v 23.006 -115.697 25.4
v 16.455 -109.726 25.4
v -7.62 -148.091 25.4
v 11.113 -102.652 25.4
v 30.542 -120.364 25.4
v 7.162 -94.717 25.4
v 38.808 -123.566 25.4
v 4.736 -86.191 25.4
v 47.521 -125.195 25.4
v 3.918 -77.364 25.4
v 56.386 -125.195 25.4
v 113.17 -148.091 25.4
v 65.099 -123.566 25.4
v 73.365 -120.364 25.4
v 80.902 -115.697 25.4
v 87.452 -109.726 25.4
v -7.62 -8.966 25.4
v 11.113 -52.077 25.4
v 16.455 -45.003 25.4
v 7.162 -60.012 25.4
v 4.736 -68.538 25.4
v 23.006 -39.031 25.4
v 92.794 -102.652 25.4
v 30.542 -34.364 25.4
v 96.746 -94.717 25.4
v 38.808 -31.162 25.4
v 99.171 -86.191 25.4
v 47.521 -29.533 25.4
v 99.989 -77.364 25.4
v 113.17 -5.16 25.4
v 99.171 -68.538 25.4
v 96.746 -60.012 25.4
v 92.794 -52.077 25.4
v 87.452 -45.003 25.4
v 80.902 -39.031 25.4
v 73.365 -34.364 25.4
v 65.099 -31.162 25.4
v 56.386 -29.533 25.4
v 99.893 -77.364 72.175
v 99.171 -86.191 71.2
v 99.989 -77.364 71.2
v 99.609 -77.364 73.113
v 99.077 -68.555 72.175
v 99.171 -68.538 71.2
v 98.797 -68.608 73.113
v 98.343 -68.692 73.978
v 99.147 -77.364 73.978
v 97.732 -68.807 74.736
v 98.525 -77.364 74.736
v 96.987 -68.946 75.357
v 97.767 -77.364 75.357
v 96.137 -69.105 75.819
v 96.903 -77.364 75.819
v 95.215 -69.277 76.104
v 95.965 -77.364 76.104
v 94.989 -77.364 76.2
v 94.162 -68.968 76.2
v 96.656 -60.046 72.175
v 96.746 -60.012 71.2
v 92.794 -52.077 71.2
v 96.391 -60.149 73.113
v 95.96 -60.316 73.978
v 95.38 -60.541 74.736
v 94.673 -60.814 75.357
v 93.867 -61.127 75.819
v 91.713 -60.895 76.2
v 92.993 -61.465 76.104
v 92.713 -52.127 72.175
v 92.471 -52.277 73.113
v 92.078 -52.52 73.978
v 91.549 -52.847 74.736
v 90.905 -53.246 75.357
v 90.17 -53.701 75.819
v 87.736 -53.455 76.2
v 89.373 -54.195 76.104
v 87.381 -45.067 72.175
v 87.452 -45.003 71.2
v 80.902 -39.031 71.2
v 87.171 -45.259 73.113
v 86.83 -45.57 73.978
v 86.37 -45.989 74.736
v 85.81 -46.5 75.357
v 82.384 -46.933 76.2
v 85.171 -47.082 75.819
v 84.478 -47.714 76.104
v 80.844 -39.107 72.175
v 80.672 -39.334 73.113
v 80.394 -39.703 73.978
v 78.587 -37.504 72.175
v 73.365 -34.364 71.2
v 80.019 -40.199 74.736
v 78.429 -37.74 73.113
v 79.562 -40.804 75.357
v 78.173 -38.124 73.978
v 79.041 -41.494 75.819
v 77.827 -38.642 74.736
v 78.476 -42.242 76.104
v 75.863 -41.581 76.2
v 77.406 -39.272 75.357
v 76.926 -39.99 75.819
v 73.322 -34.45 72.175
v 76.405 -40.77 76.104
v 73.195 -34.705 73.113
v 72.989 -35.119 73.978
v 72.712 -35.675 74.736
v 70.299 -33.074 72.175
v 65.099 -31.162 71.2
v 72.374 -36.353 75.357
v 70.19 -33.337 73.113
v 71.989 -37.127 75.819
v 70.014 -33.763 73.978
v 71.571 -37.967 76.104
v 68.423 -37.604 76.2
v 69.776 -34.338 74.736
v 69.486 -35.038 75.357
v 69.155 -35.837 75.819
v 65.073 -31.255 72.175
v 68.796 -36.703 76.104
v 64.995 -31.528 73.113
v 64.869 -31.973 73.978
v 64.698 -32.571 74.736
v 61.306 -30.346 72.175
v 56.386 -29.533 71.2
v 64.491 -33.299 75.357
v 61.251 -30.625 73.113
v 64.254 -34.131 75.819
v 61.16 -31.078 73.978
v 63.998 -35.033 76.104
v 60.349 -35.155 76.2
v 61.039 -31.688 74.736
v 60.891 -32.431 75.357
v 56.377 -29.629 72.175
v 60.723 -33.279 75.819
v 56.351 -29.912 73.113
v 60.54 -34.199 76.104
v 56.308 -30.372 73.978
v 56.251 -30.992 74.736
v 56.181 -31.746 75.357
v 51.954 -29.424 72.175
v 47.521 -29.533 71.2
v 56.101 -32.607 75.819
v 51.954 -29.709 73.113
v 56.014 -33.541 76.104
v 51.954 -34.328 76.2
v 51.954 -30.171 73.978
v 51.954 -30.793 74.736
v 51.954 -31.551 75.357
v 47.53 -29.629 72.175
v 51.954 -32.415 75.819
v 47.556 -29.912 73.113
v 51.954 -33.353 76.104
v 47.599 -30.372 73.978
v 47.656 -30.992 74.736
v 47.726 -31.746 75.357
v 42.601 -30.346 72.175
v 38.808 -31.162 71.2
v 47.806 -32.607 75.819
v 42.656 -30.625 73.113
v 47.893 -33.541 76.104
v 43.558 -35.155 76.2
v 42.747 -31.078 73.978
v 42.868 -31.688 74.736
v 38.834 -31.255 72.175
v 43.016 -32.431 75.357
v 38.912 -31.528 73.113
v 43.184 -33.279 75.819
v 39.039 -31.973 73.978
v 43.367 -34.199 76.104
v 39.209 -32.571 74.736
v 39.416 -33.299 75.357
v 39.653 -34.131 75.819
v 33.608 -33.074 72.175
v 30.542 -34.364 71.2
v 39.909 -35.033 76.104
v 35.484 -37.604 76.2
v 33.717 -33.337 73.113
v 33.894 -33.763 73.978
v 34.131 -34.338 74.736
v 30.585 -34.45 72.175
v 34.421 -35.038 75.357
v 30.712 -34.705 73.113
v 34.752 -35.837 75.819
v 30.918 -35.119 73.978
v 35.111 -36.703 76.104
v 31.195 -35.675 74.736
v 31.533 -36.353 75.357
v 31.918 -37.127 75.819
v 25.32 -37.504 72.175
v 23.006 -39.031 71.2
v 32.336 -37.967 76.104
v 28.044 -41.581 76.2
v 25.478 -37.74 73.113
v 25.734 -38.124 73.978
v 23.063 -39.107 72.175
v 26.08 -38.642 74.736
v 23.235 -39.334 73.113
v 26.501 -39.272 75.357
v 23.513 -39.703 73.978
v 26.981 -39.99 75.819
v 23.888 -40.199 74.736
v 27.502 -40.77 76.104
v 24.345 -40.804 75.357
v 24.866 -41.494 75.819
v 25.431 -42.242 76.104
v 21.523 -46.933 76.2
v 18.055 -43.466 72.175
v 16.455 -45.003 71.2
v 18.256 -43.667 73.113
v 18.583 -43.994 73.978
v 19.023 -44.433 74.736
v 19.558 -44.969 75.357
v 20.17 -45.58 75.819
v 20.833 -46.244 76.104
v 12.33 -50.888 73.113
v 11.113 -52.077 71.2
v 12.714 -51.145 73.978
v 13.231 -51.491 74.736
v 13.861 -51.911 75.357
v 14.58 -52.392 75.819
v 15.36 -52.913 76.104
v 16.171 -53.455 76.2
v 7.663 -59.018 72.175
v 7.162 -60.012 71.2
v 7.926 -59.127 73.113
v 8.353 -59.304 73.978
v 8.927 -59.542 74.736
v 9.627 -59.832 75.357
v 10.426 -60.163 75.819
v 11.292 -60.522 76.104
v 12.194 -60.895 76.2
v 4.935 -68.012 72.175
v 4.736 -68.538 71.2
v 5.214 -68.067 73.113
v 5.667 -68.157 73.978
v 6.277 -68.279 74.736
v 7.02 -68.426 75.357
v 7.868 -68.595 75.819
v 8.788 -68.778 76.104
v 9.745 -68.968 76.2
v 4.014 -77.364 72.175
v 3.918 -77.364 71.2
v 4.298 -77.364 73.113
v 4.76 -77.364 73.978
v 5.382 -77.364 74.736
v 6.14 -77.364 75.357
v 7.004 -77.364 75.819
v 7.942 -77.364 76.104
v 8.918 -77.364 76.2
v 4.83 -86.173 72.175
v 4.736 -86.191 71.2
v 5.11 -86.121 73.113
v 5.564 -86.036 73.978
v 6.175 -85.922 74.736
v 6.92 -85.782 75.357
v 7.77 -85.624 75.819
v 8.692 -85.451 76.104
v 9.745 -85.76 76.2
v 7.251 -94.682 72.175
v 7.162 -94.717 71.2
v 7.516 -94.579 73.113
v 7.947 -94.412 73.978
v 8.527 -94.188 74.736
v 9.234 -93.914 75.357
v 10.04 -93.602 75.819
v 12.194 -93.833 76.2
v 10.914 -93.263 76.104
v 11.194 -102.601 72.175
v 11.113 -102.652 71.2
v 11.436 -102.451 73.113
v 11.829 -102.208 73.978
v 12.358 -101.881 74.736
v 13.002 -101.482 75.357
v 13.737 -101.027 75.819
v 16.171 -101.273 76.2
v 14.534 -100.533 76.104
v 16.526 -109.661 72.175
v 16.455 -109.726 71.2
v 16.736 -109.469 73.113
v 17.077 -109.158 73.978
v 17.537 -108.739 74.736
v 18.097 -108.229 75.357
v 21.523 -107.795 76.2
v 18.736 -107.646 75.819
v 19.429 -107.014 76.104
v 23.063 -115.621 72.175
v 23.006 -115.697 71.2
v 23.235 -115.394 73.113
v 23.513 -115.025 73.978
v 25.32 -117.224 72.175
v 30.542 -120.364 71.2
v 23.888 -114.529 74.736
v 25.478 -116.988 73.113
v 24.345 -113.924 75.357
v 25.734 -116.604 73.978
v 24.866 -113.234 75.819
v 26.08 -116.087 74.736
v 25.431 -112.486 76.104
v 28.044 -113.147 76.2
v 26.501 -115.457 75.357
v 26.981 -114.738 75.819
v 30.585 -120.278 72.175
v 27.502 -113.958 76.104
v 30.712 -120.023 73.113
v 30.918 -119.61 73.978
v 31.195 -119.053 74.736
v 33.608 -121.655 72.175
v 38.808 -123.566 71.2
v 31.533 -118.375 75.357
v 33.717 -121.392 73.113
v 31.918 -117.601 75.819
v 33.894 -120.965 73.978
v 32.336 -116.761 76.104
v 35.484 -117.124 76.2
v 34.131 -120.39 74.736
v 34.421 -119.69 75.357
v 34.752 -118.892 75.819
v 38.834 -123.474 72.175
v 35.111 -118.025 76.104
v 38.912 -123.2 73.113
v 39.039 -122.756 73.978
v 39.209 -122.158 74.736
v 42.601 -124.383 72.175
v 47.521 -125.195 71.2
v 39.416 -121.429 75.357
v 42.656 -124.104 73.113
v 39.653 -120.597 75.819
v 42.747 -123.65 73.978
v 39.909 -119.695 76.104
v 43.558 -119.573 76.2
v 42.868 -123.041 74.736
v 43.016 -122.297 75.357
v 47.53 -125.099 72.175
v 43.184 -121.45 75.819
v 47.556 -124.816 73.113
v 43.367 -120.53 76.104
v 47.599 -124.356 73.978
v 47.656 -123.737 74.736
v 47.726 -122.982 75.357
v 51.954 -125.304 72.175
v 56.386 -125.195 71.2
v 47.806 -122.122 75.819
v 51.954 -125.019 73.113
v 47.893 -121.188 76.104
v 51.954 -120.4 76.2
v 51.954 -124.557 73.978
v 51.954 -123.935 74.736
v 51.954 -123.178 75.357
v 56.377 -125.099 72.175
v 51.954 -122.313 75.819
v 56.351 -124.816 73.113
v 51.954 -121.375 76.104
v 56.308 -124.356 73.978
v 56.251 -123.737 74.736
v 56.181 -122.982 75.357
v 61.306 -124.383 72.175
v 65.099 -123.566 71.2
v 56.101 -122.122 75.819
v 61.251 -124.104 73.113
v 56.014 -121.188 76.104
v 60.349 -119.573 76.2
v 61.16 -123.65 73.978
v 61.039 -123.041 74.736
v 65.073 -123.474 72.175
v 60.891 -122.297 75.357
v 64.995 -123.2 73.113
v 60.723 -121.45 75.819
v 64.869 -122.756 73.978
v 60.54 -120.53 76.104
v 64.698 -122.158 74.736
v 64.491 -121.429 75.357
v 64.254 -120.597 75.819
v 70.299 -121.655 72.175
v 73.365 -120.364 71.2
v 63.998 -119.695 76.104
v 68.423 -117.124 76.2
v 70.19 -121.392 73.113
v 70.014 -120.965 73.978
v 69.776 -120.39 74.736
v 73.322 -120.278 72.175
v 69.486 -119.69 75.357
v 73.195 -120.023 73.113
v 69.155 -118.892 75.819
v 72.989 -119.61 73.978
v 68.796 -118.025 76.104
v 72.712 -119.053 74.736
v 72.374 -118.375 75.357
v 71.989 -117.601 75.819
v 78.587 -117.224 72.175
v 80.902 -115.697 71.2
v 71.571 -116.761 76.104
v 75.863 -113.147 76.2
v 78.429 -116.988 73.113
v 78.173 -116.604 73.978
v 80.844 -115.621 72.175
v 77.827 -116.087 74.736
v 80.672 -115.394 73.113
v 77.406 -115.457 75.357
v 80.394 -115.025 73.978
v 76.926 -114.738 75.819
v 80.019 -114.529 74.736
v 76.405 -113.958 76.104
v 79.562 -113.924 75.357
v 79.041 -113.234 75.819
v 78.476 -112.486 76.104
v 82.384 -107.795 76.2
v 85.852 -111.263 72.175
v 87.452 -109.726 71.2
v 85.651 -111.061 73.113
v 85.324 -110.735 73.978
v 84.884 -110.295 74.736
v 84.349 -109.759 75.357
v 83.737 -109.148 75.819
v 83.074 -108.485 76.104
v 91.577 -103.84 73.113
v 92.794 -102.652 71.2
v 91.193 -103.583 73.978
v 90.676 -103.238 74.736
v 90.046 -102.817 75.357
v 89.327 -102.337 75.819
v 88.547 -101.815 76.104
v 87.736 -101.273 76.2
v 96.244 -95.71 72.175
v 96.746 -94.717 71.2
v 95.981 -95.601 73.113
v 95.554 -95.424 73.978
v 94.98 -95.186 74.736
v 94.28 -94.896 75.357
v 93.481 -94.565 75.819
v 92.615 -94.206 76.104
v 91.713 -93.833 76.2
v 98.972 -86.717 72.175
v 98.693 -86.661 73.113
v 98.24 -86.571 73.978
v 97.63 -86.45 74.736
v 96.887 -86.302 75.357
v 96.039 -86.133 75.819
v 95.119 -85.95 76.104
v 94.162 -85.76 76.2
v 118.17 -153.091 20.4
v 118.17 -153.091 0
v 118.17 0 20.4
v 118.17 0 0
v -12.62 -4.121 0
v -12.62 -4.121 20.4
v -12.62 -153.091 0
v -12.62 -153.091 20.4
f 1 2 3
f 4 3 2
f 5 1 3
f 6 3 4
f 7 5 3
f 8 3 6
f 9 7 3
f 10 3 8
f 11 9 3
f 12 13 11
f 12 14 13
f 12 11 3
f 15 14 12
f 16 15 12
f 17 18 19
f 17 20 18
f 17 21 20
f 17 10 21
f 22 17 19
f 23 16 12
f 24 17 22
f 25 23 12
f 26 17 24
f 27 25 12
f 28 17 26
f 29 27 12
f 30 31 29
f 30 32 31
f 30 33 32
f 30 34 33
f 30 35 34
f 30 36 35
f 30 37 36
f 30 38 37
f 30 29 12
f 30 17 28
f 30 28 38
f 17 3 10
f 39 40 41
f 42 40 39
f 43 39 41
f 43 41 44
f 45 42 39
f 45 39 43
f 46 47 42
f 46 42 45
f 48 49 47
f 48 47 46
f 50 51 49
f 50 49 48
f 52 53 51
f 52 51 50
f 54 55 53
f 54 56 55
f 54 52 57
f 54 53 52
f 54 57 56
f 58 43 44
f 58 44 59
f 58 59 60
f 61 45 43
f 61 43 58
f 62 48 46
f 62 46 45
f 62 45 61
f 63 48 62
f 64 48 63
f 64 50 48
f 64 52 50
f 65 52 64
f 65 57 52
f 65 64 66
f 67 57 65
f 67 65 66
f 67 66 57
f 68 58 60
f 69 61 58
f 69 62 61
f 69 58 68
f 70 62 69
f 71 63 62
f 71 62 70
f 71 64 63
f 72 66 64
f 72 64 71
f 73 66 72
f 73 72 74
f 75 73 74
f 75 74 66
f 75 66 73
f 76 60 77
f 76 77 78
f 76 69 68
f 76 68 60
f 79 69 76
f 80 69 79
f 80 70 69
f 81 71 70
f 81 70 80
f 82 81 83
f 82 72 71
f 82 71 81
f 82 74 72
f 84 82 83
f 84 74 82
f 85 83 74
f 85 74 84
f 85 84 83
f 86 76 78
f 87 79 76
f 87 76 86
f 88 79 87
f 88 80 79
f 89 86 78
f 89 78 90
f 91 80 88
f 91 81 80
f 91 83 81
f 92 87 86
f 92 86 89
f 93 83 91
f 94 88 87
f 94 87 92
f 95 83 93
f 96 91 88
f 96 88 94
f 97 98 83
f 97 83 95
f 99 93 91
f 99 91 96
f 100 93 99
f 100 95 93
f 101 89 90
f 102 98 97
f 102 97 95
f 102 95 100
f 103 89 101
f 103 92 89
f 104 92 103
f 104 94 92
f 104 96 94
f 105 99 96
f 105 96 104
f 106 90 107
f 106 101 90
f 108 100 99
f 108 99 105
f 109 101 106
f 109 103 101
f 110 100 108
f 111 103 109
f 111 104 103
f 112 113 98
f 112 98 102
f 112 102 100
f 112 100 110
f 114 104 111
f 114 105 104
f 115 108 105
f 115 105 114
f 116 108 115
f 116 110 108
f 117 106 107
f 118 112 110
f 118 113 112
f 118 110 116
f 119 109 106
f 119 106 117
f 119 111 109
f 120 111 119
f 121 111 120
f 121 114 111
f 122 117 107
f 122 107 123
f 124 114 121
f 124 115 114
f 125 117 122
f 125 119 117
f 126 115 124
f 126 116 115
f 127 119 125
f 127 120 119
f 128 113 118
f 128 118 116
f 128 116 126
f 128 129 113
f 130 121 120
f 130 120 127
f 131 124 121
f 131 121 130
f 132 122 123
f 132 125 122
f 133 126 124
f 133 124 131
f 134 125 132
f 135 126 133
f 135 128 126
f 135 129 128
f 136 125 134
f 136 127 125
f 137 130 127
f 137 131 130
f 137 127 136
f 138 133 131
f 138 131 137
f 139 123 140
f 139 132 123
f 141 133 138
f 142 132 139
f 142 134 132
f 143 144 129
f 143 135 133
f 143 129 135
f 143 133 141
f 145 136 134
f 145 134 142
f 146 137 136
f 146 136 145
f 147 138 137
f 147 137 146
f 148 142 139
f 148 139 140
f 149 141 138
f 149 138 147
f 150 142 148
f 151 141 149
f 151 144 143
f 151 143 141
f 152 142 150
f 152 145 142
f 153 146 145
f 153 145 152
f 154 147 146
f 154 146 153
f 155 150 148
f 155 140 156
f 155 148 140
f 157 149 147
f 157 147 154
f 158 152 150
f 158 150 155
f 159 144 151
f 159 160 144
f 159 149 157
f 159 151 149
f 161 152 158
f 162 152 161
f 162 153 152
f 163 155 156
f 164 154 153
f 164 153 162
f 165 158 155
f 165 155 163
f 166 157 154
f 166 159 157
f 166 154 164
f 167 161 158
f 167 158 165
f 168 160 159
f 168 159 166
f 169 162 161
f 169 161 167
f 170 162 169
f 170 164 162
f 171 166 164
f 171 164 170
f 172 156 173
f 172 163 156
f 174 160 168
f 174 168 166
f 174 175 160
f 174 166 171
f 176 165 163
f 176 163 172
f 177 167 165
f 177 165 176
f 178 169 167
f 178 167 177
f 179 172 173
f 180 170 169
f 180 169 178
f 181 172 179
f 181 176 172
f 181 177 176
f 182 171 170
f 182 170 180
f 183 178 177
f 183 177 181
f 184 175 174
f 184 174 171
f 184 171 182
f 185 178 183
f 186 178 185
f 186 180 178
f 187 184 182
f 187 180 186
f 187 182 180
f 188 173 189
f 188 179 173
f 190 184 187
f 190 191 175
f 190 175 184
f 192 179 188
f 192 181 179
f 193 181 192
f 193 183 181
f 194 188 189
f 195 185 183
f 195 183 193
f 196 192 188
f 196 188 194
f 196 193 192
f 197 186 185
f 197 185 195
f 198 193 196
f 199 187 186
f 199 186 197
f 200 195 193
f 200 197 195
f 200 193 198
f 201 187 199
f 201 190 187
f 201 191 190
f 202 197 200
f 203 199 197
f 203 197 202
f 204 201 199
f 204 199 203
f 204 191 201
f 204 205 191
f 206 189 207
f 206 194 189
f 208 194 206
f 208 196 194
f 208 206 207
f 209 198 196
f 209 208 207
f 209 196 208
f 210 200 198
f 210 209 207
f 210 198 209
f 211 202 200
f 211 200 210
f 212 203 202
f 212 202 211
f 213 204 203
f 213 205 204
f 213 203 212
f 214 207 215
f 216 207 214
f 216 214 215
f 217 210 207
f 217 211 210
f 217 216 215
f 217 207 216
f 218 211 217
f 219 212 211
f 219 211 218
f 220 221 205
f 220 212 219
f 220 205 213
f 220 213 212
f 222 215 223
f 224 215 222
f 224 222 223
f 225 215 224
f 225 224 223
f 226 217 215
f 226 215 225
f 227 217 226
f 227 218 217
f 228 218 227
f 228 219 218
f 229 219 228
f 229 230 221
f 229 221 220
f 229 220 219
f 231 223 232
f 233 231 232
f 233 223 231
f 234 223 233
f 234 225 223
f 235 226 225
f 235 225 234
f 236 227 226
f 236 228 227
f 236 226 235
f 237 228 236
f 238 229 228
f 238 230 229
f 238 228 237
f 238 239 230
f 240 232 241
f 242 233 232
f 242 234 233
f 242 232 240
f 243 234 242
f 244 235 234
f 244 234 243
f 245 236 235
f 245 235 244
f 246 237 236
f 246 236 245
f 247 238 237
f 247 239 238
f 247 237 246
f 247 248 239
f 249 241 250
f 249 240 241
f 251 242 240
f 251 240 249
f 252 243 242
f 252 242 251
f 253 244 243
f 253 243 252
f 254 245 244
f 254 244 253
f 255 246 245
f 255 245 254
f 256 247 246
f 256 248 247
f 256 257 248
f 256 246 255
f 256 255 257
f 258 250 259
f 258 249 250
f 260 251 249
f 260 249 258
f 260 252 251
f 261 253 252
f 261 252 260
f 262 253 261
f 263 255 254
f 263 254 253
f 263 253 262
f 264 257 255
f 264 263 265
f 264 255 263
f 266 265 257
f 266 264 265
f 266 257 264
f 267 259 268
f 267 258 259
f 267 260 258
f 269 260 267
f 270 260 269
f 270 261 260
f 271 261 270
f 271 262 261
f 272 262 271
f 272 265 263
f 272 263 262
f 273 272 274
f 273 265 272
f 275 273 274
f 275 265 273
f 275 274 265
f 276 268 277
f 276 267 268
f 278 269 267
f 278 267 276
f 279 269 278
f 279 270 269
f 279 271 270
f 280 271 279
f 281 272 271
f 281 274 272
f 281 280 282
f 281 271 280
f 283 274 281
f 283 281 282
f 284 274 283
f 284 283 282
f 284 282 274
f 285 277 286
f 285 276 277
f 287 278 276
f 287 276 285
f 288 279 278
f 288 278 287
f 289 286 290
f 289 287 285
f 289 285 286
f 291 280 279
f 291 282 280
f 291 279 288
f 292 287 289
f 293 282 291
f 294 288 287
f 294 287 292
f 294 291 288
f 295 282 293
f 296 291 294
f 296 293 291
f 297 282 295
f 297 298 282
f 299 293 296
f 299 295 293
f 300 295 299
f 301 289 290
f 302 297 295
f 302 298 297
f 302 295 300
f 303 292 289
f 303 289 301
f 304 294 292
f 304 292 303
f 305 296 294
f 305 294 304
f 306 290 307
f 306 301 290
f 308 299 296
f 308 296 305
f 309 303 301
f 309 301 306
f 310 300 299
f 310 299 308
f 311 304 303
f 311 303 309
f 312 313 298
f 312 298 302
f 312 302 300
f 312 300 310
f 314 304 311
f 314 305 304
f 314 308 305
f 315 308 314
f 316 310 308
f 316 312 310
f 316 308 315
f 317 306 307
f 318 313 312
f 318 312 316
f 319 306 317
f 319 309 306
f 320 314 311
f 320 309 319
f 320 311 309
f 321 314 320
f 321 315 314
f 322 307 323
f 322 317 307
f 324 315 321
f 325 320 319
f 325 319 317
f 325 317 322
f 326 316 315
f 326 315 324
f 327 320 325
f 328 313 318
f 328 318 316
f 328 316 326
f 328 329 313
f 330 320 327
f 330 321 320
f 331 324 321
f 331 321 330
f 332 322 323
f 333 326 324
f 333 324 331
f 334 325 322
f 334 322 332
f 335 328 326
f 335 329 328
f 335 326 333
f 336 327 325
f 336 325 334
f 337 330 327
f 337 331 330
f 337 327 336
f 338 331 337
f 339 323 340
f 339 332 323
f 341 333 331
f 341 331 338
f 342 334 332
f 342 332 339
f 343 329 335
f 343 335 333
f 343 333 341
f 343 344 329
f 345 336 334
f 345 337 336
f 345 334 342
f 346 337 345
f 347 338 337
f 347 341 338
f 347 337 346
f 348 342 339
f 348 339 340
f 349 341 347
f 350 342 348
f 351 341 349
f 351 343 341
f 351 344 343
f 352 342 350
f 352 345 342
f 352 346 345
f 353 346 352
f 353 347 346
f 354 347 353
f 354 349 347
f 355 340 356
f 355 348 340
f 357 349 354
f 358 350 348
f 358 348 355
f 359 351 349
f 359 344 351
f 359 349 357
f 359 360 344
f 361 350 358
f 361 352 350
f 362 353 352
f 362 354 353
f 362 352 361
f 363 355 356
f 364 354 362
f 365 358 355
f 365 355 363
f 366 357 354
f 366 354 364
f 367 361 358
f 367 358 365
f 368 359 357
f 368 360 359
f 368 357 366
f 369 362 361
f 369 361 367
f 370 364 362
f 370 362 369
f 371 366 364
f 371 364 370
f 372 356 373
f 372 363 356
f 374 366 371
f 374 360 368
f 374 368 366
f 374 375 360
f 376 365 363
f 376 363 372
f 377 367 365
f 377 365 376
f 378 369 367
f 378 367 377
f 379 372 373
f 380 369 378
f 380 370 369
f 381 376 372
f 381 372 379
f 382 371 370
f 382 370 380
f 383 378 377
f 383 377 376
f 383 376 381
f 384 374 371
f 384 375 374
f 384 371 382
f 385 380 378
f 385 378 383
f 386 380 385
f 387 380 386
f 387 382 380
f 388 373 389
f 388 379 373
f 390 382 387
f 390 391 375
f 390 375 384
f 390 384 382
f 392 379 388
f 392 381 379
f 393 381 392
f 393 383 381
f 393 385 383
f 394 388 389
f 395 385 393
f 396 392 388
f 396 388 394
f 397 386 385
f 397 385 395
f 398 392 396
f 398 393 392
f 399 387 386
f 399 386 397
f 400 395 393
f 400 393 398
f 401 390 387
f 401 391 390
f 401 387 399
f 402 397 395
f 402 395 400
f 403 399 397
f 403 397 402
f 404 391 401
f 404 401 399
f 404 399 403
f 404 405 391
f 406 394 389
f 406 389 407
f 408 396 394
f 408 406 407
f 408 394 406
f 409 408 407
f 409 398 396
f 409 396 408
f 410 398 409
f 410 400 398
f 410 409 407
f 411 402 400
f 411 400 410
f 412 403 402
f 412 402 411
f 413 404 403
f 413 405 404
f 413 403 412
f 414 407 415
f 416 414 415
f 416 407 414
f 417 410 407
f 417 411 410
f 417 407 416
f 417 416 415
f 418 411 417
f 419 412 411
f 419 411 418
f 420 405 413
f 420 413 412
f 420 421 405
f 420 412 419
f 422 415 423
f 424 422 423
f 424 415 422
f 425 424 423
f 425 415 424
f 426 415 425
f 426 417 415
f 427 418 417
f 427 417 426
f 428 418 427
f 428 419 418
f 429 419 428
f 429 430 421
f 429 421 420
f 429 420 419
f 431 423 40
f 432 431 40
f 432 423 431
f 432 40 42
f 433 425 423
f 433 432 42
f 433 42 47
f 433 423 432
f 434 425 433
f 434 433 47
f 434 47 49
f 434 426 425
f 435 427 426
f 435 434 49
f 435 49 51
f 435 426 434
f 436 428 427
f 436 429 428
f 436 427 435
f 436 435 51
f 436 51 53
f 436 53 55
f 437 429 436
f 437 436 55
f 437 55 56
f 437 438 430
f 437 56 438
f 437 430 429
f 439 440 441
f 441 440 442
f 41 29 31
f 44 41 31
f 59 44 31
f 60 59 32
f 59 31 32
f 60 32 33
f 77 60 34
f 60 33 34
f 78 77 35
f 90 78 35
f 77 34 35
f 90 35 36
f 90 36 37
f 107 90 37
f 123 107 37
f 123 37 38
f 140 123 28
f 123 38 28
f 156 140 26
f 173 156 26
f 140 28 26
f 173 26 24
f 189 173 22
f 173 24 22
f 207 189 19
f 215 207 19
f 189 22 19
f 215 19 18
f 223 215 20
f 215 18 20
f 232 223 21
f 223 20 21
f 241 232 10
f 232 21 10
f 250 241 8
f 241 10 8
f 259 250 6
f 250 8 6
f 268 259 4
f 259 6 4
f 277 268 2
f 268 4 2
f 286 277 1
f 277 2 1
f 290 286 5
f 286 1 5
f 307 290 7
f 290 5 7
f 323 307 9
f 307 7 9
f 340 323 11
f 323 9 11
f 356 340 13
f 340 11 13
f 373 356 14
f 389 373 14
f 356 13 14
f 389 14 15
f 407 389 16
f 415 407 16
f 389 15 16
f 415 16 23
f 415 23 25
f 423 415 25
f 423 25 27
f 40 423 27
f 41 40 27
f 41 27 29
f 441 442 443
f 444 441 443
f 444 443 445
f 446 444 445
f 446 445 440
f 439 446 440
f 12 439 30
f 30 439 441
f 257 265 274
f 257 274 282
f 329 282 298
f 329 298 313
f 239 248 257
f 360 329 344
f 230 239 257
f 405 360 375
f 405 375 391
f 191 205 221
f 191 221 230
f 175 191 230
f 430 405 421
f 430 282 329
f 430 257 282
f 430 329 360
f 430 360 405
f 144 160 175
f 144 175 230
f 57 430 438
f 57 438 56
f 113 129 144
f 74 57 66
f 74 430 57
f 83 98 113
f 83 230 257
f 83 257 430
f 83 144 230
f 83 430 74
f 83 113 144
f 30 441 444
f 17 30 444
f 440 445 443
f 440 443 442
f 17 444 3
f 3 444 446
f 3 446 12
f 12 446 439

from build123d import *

# Parameters (mm, degrees)
F1_DEPTH = 25.4
F2_R     = 48.0357441032
F3_DEPTH = 50.8
F4_R     = 5
F5_SIZE  = 5


# Not quite as in the source:
# - the program builds the solid bodies; features that only make, move or delete a surface that nothing else refers to are left out


with BuildPart() as f1:
    # F0 (on Top) → F1 (new body)
    with BuildSketch(Plane.XY):
        Polygon((118.1704625487, 0), (-12.6199126244, -4.1209459305), (-12.6199126244, -153.0908346176), (118.1704625487, -153.0908346176), align=None)
    extrude(amount=F1_DEPTH)

    # F2 (on face) → F3 (join)
    with BuildSketch(Plane.XY.offset(25.4)):
        with Locations((51.9535280764, -77.3641169071)):
            Circle(F2_R)
    extrude(amount=F3_DEPTH)

    # F4
    f4_edges = [f1.edges().sort_by_distance(p)[0] for p in [
        (3.917784, -77.364117, 76.2),
    ]]
    fillet(f4_edges, radius=F4_R)

    # F5
    f5_edges = [f1.edges().sort_by_distance(p)[0] for p in [
        (118.170463, -76.545417, 25.4),
        (52.775275, -2.060473, 25.4),
        (-12.619913, -78.60589, 25.4),
        (52.775275, -153.090835, 25.4),
    ]]
    chamfer(f5_edges, length=F5_SIZE)


solid = f1.part
